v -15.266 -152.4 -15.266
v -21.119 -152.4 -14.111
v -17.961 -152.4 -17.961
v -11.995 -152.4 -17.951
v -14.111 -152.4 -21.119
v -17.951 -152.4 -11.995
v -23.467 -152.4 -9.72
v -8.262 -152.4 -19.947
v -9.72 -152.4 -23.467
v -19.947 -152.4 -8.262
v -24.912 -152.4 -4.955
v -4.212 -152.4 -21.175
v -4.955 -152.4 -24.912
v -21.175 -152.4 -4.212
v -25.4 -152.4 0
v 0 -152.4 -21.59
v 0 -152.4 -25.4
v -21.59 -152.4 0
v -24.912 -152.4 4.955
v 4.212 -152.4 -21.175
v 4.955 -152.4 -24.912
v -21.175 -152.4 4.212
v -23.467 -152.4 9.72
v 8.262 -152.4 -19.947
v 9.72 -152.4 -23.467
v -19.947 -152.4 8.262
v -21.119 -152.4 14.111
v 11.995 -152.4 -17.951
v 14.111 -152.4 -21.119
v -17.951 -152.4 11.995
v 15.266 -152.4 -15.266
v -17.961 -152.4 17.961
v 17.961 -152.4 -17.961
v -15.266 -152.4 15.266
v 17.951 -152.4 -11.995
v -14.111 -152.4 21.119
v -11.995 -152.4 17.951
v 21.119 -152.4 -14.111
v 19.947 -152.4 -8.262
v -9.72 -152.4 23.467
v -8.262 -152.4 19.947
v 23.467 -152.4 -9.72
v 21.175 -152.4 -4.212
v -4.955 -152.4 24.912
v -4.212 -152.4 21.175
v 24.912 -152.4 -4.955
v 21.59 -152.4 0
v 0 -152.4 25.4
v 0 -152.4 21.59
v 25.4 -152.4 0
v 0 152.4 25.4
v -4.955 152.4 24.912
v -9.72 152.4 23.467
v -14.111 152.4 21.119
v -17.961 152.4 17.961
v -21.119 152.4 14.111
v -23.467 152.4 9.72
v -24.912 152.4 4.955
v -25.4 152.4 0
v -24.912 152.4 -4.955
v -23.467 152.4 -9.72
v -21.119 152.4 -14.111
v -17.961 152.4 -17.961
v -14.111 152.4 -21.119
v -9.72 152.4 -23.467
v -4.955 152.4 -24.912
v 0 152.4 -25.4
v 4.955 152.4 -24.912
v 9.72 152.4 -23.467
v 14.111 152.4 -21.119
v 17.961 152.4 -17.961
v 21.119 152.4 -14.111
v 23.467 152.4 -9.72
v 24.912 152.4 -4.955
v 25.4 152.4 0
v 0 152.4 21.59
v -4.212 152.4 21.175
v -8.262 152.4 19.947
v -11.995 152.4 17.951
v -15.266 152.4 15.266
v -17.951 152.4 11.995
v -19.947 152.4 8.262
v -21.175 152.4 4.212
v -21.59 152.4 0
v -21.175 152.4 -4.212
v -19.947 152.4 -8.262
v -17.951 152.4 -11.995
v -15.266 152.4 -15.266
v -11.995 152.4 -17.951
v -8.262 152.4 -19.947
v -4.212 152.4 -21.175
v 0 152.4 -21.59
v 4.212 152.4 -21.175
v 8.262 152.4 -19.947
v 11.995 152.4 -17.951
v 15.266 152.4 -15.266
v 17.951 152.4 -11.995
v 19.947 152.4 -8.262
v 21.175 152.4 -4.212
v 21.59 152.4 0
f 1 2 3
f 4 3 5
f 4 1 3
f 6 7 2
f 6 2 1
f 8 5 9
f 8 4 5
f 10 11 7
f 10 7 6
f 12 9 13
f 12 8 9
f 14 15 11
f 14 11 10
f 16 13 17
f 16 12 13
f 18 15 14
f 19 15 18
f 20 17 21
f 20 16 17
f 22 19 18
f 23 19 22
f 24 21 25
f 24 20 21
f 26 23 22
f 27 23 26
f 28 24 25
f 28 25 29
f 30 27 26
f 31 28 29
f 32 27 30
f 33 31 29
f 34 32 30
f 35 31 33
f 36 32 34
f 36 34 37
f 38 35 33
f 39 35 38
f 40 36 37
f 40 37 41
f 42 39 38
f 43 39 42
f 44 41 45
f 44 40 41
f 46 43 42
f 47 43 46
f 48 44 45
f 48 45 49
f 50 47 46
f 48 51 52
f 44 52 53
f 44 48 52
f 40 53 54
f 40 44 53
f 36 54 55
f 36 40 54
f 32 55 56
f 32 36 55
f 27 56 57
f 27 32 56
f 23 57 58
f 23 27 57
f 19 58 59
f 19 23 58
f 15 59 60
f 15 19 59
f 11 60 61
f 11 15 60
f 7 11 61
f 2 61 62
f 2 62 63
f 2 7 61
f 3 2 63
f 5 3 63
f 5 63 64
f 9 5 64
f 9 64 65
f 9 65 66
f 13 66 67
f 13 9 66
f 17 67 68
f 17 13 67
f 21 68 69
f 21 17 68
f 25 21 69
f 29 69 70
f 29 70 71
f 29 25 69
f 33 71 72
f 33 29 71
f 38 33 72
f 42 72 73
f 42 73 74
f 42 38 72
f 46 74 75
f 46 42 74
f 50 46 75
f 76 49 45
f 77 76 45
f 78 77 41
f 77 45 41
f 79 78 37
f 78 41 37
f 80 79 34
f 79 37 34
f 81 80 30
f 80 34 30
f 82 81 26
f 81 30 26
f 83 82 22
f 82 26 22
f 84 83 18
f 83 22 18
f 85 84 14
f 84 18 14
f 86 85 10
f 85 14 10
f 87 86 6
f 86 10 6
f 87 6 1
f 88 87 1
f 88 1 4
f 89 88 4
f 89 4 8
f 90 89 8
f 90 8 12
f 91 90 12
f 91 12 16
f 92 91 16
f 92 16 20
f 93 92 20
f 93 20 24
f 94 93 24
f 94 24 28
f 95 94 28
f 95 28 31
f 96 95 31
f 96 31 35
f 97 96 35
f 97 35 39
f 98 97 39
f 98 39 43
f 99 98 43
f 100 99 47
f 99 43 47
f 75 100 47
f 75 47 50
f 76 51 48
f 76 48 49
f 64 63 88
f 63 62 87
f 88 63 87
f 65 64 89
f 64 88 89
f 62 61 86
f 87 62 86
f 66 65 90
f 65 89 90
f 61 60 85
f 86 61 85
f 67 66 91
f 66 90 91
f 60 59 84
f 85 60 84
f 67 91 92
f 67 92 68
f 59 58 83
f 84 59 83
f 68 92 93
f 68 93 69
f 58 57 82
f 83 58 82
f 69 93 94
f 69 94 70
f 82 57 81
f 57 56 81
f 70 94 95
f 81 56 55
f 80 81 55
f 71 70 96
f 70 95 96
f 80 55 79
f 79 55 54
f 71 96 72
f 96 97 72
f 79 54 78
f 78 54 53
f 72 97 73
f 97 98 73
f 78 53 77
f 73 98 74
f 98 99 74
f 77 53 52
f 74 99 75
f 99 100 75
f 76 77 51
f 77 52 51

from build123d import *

# Parameters (mm, degrees)
F0_R     = 25.4
F1_DEPTH = 152.4
F3_DEPTH = 304.801
F4_R     = 21.59
F5_DEPTH = 304.801


with BuildPart() as f1:
    # F0 (on Front) → F1 (new body, symmetric)
    with BuildSketch(Plane.XZ):
        Circle(F0_R)
    extrude(amount=F1_DEPTH, both=True)

    # F2 (on face) → F3 (cut, through all)
    with BuildSketch(Plane.XZ.offset(152.4)):
        with BuildLine():
            Line((0, 25.4), (0, 0))
            Line((0, 0), (25.4, 0))
            ThreePointArc((25.4, 0), (17.960512, 17.960512), (0, 25.4))
        make_face()
    extrude(amount=-F3_DEPTH, mode=Mode.SUBTRACT)

    # F4 (on face) → F5 (cut, through all)
    with BuildSketch(Plane.XZ.offset(152.4)):
        Circle(F4_R)
    extrude(amount=-F5_DEPTH, mode=Mode.SUBTRACT)


solid = f1.part
